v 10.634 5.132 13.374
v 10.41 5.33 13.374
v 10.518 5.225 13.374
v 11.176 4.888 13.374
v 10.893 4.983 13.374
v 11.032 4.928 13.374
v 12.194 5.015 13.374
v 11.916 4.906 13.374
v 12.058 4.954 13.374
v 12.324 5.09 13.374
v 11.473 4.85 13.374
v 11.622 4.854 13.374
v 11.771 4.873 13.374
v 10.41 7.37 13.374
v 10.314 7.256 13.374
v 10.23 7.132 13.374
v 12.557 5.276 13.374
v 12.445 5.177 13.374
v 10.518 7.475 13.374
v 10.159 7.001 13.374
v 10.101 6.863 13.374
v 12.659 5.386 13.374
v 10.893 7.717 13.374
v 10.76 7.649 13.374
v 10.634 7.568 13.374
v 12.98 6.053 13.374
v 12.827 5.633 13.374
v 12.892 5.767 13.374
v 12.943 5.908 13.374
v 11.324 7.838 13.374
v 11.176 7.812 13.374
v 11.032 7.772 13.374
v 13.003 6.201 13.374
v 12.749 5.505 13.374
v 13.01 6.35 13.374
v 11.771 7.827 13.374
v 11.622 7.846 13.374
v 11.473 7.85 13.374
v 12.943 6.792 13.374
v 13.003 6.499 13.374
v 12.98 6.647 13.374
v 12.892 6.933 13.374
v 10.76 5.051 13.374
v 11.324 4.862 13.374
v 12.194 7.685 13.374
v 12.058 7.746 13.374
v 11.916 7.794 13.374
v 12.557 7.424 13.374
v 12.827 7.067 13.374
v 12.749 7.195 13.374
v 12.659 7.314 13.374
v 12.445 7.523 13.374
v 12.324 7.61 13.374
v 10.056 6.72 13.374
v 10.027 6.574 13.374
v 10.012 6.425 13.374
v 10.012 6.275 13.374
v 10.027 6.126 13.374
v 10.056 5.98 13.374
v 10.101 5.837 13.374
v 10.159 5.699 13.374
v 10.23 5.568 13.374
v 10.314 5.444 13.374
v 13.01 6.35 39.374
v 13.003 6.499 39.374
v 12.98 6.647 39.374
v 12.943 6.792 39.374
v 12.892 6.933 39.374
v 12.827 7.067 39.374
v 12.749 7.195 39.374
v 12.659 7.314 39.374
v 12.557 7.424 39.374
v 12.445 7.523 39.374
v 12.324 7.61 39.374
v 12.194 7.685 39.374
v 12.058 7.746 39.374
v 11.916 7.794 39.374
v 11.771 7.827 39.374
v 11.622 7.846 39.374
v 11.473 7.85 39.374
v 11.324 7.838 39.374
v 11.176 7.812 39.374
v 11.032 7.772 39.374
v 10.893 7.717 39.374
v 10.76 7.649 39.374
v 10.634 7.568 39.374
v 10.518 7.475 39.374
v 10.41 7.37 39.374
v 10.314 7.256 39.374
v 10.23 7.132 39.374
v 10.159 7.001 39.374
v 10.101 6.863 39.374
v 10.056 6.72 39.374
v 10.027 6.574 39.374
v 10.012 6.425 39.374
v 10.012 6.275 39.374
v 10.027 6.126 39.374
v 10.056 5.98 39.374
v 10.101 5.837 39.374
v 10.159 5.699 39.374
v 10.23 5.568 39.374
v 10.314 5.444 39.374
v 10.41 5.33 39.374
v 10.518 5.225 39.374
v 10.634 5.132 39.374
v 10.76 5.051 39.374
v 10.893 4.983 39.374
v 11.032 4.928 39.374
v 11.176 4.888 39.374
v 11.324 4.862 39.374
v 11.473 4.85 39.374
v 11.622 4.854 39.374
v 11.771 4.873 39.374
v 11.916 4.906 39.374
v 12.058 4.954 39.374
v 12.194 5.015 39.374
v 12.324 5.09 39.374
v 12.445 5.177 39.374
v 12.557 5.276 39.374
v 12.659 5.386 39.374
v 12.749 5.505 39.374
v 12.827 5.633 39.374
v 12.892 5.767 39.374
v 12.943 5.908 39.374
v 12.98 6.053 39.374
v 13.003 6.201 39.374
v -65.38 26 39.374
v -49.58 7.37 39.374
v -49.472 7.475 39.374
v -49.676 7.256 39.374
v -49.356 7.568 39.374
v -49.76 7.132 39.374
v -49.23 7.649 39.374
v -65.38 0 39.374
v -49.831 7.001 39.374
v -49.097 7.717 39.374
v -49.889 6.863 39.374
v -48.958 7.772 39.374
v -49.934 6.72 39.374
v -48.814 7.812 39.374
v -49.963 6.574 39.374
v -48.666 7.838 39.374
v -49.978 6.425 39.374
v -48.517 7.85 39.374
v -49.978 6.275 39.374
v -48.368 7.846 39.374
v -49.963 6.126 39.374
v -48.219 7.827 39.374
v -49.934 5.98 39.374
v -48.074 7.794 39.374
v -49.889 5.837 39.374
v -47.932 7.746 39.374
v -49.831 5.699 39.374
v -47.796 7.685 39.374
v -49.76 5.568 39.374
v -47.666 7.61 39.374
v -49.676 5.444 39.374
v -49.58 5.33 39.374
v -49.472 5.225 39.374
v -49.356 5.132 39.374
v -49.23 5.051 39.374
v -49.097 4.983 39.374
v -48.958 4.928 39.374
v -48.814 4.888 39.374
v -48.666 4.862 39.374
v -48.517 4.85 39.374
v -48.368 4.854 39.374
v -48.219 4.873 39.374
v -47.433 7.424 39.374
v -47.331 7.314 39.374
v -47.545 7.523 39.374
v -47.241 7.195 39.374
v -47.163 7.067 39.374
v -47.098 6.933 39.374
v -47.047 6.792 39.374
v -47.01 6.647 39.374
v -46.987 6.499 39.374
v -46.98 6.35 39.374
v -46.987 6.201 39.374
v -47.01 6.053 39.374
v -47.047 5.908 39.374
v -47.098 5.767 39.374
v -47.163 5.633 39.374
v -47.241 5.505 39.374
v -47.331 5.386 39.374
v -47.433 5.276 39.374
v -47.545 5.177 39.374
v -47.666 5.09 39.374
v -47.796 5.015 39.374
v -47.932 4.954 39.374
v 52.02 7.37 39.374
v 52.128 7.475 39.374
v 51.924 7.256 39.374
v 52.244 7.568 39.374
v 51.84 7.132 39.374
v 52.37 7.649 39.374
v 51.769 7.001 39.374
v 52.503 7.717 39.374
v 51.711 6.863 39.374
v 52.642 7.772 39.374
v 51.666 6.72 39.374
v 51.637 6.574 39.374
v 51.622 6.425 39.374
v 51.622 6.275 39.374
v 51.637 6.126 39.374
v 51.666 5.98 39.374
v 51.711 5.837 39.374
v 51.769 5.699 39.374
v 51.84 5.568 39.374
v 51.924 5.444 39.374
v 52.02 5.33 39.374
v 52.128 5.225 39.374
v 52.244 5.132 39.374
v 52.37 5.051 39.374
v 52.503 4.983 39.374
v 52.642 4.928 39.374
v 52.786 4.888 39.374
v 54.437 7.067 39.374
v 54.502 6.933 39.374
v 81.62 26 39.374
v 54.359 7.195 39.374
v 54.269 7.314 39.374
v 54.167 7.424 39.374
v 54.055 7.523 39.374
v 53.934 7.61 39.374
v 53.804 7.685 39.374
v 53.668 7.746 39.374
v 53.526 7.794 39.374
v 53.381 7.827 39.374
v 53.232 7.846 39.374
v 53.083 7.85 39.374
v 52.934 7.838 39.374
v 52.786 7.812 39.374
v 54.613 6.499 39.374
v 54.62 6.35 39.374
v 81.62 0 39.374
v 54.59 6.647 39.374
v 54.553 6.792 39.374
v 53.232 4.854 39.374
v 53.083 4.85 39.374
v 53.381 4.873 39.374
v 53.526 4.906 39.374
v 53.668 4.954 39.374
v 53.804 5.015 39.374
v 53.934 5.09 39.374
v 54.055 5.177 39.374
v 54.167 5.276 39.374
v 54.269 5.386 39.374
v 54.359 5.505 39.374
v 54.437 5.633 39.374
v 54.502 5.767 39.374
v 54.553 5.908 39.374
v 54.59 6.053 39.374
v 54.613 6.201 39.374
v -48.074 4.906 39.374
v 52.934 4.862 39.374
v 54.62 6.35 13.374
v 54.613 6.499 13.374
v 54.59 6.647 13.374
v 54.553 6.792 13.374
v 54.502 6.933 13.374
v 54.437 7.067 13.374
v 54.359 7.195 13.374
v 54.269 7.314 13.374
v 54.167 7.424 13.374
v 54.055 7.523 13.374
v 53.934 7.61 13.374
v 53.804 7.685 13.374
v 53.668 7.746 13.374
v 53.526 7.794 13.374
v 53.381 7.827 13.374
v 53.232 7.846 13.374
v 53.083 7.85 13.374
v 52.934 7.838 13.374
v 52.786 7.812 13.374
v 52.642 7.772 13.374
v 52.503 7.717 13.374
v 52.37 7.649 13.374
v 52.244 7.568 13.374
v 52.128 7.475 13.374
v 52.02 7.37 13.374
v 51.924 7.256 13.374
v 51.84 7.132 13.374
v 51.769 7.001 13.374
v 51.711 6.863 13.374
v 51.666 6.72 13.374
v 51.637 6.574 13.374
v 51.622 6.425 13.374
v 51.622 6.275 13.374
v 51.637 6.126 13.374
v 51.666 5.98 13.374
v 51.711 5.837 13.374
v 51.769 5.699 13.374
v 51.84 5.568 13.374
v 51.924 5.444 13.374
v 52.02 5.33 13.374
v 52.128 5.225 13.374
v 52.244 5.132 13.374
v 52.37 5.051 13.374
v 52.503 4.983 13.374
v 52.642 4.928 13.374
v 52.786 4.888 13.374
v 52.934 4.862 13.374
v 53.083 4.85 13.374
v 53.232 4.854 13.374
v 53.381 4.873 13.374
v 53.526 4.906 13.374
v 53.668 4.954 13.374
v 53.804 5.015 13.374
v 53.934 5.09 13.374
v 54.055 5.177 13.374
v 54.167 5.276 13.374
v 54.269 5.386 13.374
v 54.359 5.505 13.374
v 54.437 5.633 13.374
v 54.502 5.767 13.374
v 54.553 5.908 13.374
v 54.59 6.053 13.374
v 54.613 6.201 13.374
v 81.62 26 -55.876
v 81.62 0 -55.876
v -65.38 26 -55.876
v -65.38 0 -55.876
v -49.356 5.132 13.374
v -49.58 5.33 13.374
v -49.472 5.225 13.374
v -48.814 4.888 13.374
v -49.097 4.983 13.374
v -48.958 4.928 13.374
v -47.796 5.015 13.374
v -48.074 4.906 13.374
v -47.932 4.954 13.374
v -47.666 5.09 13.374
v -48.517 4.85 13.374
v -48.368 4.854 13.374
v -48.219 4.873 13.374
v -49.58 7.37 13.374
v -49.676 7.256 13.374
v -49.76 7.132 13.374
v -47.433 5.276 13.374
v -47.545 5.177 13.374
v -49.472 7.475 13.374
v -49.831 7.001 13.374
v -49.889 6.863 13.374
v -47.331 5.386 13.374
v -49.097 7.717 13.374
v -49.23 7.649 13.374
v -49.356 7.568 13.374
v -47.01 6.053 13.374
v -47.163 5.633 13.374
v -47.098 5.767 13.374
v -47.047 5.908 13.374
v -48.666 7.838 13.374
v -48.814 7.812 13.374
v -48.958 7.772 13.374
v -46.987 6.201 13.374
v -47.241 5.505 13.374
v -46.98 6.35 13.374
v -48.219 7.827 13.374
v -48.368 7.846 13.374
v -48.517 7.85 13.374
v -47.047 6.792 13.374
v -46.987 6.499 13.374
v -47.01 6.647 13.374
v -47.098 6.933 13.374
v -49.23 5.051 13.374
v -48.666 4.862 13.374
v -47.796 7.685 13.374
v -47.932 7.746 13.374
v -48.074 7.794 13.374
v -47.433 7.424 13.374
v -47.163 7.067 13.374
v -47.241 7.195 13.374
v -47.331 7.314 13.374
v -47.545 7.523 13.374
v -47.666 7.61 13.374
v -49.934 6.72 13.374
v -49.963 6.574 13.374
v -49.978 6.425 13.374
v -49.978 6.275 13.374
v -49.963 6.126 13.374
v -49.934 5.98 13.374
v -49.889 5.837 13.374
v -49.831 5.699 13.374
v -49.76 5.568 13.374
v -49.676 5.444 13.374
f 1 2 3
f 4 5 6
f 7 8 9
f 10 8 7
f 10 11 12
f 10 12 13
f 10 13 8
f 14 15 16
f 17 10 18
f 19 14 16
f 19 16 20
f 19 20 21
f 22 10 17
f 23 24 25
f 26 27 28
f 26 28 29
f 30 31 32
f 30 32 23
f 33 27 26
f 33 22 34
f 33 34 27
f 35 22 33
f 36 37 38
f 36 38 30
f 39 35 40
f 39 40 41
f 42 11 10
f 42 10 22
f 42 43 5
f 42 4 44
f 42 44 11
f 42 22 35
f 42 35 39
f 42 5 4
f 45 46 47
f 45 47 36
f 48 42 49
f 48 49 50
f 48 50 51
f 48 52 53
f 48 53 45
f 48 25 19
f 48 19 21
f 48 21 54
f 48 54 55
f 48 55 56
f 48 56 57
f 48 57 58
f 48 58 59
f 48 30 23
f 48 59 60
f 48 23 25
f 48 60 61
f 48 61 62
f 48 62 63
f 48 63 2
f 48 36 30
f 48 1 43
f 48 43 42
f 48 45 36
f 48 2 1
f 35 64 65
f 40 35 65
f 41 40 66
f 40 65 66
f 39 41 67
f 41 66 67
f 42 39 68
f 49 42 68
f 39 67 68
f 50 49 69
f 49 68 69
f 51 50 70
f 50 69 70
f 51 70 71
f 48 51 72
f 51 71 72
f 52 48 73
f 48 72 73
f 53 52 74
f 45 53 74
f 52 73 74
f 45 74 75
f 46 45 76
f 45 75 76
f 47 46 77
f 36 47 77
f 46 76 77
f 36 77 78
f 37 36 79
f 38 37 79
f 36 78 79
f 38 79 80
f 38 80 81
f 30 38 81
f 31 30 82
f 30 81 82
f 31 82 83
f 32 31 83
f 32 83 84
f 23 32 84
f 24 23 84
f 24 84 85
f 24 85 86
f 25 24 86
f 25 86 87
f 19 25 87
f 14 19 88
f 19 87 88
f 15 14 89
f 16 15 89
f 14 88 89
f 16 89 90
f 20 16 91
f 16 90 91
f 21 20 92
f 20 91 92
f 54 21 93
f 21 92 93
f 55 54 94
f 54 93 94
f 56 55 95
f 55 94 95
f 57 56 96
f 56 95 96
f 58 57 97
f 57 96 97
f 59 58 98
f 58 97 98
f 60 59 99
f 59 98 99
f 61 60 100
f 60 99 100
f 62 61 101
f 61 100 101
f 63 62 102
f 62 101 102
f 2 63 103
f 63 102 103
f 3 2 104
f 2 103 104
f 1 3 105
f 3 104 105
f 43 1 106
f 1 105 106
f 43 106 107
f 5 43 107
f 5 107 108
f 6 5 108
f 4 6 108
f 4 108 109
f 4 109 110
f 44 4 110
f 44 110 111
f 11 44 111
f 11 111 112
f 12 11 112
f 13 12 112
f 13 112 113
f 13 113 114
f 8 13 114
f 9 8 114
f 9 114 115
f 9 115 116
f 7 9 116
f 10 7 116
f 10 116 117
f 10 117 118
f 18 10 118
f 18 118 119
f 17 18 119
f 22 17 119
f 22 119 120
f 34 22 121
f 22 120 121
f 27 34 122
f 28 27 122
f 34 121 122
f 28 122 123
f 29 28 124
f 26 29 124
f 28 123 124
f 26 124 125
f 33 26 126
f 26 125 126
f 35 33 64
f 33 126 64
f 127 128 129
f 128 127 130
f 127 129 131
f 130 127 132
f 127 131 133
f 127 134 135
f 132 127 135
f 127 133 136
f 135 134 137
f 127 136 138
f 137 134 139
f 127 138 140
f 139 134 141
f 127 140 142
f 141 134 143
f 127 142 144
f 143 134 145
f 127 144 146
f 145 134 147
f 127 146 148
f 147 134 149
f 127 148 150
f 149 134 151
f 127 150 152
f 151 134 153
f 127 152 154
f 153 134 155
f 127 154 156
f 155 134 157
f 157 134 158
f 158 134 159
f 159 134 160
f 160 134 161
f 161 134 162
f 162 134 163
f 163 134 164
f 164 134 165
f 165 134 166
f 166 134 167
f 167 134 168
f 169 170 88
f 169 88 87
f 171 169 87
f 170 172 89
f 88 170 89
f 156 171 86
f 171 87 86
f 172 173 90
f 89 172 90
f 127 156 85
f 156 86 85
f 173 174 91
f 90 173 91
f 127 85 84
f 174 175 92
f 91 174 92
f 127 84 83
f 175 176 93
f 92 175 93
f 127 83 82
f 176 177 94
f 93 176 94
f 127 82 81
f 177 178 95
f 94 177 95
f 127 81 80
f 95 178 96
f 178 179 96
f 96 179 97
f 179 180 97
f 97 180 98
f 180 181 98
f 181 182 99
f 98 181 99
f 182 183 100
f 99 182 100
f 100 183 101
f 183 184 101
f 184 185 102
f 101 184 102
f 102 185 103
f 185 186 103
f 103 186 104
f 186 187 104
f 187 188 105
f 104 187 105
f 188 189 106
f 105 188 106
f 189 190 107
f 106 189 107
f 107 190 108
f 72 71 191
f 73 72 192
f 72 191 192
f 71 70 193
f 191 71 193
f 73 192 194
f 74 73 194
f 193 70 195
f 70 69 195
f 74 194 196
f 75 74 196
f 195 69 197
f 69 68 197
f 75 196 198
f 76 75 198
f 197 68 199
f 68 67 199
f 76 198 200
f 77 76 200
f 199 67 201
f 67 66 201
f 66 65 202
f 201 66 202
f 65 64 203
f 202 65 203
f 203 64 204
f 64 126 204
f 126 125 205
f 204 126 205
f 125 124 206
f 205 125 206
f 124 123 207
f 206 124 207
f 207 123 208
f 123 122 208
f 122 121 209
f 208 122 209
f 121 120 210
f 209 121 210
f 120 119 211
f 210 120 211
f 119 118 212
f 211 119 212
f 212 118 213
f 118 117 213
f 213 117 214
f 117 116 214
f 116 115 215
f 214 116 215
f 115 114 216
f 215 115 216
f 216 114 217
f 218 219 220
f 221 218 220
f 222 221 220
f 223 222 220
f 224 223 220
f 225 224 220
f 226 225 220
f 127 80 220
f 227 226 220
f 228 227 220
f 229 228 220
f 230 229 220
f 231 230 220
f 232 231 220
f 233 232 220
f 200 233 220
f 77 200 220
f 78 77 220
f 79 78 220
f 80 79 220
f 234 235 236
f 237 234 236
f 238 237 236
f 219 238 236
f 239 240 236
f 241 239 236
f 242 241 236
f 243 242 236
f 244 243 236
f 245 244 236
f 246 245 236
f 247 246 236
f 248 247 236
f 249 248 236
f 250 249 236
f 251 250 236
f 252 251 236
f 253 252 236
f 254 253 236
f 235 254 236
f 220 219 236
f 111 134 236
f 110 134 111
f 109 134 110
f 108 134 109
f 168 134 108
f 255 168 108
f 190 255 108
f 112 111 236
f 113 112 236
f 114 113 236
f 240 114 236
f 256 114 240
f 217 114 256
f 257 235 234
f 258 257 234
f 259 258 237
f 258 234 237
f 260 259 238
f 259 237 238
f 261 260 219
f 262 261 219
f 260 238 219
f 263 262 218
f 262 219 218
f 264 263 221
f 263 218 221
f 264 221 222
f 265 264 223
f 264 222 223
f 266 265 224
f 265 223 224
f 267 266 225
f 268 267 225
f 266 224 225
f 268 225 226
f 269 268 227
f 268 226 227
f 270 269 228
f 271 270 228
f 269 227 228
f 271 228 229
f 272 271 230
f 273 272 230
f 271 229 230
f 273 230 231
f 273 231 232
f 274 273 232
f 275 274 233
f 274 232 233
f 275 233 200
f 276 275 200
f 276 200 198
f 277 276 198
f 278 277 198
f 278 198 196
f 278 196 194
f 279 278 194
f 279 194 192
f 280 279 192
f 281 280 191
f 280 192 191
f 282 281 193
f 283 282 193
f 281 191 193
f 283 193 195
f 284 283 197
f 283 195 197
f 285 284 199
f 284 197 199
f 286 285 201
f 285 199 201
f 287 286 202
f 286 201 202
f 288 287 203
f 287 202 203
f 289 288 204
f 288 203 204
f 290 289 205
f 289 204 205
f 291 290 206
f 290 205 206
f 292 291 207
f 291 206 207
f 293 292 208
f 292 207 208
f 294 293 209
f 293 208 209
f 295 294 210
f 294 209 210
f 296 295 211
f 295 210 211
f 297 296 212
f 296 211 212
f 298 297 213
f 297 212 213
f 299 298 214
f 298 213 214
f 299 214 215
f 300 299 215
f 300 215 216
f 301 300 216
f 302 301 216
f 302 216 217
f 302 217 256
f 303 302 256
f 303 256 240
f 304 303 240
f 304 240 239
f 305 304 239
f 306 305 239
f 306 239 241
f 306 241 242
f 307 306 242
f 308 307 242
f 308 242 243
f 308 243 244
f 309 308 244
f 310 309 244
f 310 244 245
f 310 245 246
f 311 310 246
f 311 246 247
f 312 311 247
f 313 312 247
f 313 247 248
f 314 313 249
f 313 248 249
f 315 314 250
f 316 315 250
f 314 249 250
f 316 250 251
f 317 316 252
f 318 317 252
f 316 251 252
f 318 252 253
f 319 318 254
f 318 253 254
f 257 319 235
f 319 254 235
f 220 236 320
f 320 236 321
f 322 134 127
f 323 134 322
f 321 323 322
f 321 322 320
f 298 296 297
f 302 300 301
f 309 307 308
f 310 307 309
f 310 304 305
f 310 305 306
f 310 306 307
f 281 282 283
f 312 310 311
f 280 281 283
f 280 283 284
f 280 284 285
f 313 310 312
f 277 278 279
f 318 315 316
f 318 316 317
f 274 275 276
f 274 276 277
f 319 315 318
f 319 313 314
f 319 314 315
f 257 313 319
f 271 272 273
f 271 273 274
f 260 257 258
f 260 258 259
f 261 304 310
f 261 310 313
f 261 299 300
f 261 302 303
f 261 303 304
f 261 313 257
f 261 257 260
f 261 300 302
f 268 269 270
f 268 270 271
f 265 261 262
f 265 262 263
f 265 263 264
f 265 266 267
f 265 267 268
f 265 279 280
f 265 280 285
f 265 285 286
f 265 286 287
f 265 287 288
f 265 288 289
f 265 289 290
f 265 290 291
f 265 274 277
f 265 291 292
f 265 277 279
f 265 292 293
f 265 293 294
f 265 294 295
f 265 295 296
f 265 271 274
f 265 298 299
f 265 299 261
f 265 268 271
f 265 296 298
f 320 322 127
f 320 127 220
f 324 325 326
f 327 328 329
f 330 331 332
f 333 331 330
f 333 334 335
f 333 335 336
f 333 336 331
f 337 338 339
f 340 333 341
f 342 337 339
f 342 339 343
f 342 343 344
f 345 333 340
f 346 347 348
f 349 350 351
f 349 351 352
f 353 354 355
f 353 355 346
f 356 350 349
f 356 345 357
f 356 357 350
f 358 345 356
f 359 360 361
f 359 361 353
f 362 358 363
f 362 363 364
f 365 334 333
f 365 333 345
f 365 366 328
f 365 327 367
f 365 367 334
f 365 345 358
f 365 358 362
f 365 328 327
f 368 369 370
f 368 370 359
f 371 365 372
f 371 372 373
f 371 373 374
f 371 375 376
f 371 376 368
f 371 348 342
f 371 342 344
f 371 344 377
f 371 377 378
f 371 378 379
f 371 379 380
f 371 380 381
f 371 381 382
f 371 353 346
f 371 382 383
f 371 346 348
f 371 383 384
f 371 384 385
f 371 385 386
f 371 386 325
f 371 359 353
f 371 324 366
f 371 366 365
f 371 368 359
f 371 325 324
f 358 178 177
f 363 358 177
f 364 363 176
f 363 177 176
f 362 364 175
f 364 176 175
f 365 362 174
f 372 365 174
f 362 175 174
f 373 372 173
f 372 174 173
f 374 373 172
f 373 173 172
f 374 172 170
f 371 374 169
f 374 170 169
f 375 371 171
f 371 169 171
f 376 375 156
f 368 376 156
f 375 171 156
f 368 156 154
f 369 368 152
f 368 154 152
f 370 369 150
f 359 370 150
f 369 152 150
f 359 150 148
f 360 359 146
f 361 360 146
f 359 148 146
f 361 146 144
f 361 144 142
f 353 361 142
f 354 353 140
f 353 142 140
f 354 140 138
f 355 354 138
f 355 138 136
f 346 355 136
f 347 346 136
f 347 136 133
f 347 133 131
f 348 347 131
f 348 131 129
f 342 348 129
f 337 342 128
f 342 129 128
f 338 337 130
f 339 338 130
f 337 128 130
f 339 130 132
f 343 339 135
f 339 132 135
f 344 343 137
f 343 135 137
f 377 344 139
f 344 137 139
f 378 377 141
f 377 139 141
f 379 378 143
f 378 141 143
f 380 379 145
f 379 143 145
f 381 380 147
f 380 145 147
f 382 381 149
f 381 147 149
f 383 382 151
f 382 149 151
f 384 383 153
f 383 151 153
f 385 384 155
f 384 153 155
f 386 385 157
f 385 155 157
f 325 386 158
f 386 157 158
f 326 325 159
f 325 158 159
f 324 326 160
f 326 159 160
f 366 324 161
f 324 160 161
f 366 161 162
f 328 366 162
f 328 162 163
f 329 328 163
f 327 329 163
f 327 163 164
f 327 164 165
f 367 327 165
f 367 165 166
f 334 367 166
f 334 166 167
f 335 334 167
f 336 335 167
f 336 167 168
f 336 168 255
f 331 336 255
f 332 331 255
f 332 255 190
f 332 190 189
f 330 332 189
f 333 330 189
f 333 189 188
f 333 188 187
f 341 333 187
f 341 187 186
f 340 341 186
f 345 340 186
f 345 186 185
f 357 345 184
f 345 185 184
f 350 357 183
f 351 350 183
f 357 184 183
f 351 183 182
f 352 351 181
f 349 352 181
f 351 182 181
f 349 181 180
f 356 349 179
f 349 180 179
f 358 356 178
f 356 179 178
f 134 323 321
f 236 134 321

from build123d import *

# Parameters (mm, degrees)
SKETCH1_W           = 147
SKETCH1_H           = 95.25
BOSS_EXTRUDE1_DEPTH = 26
SKETCH2_R           = 1.5
CUT_EXTRUDE3_DEPTH  = 26


with BuildPart() as part:
    # Sketch1 → Boss-Extrude1 (new body)
    with BuildSketch(Plane(origin=(0, 0, 0), x_dir=(1, 0, 0), z_dir=(0, 1, 0))):
        with Locations((8.120065789, 8.250822368)):
            Rectangle(SKETCH1_W, SKETCH1_H)
    extrude(amount=BOSS_EXTRUDE1_DEPTH)

    # Sketch2 → Cut-Extrude3 (cut)
    with BuildSketch(Plane.XY.offset(39.374177632)):
        with Locations((-48.479934211, 6.35)):
            Circle(SKETCH2_R)
        with Locations((11.510065789, 6.35)):
            Circle(SKETCH2_R)
        with Locations((53.120065789, 6.35)):
            Circle(SKETCH2_R)
    extrude(amount=-CUT_EXTRUDE3_DEPTH, mode=Mode.SUBTRACT)


solid = part.part
